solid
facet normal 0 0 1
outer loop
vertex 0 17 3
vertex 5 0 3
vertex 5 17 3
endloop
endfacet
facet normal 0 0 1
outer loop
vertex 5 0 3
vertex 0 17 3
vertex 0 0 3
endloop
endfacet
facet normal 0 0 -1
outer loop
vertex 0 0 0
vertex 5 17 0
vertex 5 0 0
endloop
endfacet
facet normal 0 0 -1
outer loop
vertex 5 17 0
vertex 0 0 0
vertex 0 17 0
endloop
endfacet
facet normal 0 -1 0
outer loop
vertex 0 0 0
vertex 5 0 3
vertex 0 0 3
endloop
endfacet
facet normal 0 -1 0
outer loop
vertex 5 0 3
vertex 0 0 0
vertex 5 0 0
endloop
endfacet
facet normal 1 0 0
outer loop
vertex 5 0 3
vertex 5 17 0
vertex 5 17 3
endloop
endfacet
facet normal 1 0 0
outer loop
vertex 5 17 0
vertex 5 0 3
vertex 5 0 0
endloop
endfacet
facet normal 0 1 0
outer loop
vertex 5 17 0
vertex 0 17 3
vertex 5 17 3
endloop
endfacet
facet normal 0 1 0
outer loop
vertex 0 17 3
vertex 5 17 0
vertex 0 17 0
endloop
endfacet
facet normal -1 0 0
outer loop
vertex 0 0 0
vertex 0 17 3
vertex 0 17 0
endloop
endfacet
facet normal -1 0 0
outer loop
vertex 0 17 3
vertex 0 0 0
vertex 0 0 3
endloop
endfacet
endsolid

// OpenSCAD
// Generated by SolidPython 1.0.1 on 2020-07-29 00:46:54


cube(size = [5, 17, 3]);
/***********************************************
*********      SolidPython code:      **********
************************************************
 
# import packages: SolidPython
from solid import *
from solid.utils import *
from itertools import chain, combinations, permutations


class Resize:

    def __init__(self, scad_file):
        self.scad_file = scad_file
        #self.scad_file = import_scad(scad_file)
        # cone/cylinder param:
        self.r1 = 0
        self.r2 = 0
        self.h = 0
        # rectangular prism param:
        self.w = 0
        self.l = 0
        # ellipse param:
        self.r = 0

    # import OpenScad code (file name corresponds to shape)


    # classify shape + parameters
    def assign(self, param1, param2, param3):
        if self.scad_file == 'cone.scad':
            self.r1 = param1
            self.r2 = param2
            self.h = param3
        elif self.scad_file == 'cylinder.scad':
            self.r1 = param1
            self.r2 = param2
            self.h = param3
        elif self.scad_file == 'rectangularPrism.scad':
            self.h = param1
            self.l = param2
            self.w = param3
        else:
            self.r = param1
            self.h = param2

    # resize parameters
    def iterate(self):
        x = range(3, 20, 2)
        i = 1
        if self.scad_file == 'cone.scad':
            tempList = list(permutations(x, 2))
            for temp in tempList:
                param1 = temp[0]
                param2 = temp[1]
                filepath = 'produced_scad_files/' + 'cone' + str(param1) + '_' + str(param2) + '_' + '.scad'
                scad_render_to_file(cylinder(h=param1, r1=param2, r2=0), filepath)

        elif self.scad_file == 'cylinder.scad':
            tempList = list(permutations(x, 3))
            for temp in tempList:
                param1 = temp[0]
                param2 = temp[1]
                filepath = 'produced_scad_files/' + 'cylinder' + str(param1) + '_' + str(param2) + '_' + '.scad'
                scad_render_to_file(cylinder(h=param1, r1=param2, r2=param2), filepath)

        elif self.scad_file == 'rectangularPrism.scad':
            tempList = list(permutations(x, 3))
            for temp in tempList:
                param1 = temp[0]
                param2 = temp[1]
                param3 = temp[2]
                filepath = 'produced_scad_files/' + 'rectangularPrism' + str(param1) + '_' + str(param2) + '_' + str(
                    param3) + '.scad'
                scad_render_to_file(cube(size=(param1, param2, param3)), filepath)

        elif self.scad_file == 'ellipse.scad':
            tempList = list(permutations(x, 4))
            for temp in tempList:
                param1 = temp[0]
                param2 = temp[1]
                param3 = temp[2]
                param4 = temp[3]
                filepath = 'produced_scad_files/' + 'ellipse' + str(param1) + '_' + str(param2) + '_' + str(param3) + '_' + str(param4) + '.scad'
                scad_render_to_file(scale([param1, param2, param3])(sphere(r=param4)), filepath)

    def render_to_scadfile(self):
        scad_render_to_file(scad, 'example.scad') 
 
************************************************/
